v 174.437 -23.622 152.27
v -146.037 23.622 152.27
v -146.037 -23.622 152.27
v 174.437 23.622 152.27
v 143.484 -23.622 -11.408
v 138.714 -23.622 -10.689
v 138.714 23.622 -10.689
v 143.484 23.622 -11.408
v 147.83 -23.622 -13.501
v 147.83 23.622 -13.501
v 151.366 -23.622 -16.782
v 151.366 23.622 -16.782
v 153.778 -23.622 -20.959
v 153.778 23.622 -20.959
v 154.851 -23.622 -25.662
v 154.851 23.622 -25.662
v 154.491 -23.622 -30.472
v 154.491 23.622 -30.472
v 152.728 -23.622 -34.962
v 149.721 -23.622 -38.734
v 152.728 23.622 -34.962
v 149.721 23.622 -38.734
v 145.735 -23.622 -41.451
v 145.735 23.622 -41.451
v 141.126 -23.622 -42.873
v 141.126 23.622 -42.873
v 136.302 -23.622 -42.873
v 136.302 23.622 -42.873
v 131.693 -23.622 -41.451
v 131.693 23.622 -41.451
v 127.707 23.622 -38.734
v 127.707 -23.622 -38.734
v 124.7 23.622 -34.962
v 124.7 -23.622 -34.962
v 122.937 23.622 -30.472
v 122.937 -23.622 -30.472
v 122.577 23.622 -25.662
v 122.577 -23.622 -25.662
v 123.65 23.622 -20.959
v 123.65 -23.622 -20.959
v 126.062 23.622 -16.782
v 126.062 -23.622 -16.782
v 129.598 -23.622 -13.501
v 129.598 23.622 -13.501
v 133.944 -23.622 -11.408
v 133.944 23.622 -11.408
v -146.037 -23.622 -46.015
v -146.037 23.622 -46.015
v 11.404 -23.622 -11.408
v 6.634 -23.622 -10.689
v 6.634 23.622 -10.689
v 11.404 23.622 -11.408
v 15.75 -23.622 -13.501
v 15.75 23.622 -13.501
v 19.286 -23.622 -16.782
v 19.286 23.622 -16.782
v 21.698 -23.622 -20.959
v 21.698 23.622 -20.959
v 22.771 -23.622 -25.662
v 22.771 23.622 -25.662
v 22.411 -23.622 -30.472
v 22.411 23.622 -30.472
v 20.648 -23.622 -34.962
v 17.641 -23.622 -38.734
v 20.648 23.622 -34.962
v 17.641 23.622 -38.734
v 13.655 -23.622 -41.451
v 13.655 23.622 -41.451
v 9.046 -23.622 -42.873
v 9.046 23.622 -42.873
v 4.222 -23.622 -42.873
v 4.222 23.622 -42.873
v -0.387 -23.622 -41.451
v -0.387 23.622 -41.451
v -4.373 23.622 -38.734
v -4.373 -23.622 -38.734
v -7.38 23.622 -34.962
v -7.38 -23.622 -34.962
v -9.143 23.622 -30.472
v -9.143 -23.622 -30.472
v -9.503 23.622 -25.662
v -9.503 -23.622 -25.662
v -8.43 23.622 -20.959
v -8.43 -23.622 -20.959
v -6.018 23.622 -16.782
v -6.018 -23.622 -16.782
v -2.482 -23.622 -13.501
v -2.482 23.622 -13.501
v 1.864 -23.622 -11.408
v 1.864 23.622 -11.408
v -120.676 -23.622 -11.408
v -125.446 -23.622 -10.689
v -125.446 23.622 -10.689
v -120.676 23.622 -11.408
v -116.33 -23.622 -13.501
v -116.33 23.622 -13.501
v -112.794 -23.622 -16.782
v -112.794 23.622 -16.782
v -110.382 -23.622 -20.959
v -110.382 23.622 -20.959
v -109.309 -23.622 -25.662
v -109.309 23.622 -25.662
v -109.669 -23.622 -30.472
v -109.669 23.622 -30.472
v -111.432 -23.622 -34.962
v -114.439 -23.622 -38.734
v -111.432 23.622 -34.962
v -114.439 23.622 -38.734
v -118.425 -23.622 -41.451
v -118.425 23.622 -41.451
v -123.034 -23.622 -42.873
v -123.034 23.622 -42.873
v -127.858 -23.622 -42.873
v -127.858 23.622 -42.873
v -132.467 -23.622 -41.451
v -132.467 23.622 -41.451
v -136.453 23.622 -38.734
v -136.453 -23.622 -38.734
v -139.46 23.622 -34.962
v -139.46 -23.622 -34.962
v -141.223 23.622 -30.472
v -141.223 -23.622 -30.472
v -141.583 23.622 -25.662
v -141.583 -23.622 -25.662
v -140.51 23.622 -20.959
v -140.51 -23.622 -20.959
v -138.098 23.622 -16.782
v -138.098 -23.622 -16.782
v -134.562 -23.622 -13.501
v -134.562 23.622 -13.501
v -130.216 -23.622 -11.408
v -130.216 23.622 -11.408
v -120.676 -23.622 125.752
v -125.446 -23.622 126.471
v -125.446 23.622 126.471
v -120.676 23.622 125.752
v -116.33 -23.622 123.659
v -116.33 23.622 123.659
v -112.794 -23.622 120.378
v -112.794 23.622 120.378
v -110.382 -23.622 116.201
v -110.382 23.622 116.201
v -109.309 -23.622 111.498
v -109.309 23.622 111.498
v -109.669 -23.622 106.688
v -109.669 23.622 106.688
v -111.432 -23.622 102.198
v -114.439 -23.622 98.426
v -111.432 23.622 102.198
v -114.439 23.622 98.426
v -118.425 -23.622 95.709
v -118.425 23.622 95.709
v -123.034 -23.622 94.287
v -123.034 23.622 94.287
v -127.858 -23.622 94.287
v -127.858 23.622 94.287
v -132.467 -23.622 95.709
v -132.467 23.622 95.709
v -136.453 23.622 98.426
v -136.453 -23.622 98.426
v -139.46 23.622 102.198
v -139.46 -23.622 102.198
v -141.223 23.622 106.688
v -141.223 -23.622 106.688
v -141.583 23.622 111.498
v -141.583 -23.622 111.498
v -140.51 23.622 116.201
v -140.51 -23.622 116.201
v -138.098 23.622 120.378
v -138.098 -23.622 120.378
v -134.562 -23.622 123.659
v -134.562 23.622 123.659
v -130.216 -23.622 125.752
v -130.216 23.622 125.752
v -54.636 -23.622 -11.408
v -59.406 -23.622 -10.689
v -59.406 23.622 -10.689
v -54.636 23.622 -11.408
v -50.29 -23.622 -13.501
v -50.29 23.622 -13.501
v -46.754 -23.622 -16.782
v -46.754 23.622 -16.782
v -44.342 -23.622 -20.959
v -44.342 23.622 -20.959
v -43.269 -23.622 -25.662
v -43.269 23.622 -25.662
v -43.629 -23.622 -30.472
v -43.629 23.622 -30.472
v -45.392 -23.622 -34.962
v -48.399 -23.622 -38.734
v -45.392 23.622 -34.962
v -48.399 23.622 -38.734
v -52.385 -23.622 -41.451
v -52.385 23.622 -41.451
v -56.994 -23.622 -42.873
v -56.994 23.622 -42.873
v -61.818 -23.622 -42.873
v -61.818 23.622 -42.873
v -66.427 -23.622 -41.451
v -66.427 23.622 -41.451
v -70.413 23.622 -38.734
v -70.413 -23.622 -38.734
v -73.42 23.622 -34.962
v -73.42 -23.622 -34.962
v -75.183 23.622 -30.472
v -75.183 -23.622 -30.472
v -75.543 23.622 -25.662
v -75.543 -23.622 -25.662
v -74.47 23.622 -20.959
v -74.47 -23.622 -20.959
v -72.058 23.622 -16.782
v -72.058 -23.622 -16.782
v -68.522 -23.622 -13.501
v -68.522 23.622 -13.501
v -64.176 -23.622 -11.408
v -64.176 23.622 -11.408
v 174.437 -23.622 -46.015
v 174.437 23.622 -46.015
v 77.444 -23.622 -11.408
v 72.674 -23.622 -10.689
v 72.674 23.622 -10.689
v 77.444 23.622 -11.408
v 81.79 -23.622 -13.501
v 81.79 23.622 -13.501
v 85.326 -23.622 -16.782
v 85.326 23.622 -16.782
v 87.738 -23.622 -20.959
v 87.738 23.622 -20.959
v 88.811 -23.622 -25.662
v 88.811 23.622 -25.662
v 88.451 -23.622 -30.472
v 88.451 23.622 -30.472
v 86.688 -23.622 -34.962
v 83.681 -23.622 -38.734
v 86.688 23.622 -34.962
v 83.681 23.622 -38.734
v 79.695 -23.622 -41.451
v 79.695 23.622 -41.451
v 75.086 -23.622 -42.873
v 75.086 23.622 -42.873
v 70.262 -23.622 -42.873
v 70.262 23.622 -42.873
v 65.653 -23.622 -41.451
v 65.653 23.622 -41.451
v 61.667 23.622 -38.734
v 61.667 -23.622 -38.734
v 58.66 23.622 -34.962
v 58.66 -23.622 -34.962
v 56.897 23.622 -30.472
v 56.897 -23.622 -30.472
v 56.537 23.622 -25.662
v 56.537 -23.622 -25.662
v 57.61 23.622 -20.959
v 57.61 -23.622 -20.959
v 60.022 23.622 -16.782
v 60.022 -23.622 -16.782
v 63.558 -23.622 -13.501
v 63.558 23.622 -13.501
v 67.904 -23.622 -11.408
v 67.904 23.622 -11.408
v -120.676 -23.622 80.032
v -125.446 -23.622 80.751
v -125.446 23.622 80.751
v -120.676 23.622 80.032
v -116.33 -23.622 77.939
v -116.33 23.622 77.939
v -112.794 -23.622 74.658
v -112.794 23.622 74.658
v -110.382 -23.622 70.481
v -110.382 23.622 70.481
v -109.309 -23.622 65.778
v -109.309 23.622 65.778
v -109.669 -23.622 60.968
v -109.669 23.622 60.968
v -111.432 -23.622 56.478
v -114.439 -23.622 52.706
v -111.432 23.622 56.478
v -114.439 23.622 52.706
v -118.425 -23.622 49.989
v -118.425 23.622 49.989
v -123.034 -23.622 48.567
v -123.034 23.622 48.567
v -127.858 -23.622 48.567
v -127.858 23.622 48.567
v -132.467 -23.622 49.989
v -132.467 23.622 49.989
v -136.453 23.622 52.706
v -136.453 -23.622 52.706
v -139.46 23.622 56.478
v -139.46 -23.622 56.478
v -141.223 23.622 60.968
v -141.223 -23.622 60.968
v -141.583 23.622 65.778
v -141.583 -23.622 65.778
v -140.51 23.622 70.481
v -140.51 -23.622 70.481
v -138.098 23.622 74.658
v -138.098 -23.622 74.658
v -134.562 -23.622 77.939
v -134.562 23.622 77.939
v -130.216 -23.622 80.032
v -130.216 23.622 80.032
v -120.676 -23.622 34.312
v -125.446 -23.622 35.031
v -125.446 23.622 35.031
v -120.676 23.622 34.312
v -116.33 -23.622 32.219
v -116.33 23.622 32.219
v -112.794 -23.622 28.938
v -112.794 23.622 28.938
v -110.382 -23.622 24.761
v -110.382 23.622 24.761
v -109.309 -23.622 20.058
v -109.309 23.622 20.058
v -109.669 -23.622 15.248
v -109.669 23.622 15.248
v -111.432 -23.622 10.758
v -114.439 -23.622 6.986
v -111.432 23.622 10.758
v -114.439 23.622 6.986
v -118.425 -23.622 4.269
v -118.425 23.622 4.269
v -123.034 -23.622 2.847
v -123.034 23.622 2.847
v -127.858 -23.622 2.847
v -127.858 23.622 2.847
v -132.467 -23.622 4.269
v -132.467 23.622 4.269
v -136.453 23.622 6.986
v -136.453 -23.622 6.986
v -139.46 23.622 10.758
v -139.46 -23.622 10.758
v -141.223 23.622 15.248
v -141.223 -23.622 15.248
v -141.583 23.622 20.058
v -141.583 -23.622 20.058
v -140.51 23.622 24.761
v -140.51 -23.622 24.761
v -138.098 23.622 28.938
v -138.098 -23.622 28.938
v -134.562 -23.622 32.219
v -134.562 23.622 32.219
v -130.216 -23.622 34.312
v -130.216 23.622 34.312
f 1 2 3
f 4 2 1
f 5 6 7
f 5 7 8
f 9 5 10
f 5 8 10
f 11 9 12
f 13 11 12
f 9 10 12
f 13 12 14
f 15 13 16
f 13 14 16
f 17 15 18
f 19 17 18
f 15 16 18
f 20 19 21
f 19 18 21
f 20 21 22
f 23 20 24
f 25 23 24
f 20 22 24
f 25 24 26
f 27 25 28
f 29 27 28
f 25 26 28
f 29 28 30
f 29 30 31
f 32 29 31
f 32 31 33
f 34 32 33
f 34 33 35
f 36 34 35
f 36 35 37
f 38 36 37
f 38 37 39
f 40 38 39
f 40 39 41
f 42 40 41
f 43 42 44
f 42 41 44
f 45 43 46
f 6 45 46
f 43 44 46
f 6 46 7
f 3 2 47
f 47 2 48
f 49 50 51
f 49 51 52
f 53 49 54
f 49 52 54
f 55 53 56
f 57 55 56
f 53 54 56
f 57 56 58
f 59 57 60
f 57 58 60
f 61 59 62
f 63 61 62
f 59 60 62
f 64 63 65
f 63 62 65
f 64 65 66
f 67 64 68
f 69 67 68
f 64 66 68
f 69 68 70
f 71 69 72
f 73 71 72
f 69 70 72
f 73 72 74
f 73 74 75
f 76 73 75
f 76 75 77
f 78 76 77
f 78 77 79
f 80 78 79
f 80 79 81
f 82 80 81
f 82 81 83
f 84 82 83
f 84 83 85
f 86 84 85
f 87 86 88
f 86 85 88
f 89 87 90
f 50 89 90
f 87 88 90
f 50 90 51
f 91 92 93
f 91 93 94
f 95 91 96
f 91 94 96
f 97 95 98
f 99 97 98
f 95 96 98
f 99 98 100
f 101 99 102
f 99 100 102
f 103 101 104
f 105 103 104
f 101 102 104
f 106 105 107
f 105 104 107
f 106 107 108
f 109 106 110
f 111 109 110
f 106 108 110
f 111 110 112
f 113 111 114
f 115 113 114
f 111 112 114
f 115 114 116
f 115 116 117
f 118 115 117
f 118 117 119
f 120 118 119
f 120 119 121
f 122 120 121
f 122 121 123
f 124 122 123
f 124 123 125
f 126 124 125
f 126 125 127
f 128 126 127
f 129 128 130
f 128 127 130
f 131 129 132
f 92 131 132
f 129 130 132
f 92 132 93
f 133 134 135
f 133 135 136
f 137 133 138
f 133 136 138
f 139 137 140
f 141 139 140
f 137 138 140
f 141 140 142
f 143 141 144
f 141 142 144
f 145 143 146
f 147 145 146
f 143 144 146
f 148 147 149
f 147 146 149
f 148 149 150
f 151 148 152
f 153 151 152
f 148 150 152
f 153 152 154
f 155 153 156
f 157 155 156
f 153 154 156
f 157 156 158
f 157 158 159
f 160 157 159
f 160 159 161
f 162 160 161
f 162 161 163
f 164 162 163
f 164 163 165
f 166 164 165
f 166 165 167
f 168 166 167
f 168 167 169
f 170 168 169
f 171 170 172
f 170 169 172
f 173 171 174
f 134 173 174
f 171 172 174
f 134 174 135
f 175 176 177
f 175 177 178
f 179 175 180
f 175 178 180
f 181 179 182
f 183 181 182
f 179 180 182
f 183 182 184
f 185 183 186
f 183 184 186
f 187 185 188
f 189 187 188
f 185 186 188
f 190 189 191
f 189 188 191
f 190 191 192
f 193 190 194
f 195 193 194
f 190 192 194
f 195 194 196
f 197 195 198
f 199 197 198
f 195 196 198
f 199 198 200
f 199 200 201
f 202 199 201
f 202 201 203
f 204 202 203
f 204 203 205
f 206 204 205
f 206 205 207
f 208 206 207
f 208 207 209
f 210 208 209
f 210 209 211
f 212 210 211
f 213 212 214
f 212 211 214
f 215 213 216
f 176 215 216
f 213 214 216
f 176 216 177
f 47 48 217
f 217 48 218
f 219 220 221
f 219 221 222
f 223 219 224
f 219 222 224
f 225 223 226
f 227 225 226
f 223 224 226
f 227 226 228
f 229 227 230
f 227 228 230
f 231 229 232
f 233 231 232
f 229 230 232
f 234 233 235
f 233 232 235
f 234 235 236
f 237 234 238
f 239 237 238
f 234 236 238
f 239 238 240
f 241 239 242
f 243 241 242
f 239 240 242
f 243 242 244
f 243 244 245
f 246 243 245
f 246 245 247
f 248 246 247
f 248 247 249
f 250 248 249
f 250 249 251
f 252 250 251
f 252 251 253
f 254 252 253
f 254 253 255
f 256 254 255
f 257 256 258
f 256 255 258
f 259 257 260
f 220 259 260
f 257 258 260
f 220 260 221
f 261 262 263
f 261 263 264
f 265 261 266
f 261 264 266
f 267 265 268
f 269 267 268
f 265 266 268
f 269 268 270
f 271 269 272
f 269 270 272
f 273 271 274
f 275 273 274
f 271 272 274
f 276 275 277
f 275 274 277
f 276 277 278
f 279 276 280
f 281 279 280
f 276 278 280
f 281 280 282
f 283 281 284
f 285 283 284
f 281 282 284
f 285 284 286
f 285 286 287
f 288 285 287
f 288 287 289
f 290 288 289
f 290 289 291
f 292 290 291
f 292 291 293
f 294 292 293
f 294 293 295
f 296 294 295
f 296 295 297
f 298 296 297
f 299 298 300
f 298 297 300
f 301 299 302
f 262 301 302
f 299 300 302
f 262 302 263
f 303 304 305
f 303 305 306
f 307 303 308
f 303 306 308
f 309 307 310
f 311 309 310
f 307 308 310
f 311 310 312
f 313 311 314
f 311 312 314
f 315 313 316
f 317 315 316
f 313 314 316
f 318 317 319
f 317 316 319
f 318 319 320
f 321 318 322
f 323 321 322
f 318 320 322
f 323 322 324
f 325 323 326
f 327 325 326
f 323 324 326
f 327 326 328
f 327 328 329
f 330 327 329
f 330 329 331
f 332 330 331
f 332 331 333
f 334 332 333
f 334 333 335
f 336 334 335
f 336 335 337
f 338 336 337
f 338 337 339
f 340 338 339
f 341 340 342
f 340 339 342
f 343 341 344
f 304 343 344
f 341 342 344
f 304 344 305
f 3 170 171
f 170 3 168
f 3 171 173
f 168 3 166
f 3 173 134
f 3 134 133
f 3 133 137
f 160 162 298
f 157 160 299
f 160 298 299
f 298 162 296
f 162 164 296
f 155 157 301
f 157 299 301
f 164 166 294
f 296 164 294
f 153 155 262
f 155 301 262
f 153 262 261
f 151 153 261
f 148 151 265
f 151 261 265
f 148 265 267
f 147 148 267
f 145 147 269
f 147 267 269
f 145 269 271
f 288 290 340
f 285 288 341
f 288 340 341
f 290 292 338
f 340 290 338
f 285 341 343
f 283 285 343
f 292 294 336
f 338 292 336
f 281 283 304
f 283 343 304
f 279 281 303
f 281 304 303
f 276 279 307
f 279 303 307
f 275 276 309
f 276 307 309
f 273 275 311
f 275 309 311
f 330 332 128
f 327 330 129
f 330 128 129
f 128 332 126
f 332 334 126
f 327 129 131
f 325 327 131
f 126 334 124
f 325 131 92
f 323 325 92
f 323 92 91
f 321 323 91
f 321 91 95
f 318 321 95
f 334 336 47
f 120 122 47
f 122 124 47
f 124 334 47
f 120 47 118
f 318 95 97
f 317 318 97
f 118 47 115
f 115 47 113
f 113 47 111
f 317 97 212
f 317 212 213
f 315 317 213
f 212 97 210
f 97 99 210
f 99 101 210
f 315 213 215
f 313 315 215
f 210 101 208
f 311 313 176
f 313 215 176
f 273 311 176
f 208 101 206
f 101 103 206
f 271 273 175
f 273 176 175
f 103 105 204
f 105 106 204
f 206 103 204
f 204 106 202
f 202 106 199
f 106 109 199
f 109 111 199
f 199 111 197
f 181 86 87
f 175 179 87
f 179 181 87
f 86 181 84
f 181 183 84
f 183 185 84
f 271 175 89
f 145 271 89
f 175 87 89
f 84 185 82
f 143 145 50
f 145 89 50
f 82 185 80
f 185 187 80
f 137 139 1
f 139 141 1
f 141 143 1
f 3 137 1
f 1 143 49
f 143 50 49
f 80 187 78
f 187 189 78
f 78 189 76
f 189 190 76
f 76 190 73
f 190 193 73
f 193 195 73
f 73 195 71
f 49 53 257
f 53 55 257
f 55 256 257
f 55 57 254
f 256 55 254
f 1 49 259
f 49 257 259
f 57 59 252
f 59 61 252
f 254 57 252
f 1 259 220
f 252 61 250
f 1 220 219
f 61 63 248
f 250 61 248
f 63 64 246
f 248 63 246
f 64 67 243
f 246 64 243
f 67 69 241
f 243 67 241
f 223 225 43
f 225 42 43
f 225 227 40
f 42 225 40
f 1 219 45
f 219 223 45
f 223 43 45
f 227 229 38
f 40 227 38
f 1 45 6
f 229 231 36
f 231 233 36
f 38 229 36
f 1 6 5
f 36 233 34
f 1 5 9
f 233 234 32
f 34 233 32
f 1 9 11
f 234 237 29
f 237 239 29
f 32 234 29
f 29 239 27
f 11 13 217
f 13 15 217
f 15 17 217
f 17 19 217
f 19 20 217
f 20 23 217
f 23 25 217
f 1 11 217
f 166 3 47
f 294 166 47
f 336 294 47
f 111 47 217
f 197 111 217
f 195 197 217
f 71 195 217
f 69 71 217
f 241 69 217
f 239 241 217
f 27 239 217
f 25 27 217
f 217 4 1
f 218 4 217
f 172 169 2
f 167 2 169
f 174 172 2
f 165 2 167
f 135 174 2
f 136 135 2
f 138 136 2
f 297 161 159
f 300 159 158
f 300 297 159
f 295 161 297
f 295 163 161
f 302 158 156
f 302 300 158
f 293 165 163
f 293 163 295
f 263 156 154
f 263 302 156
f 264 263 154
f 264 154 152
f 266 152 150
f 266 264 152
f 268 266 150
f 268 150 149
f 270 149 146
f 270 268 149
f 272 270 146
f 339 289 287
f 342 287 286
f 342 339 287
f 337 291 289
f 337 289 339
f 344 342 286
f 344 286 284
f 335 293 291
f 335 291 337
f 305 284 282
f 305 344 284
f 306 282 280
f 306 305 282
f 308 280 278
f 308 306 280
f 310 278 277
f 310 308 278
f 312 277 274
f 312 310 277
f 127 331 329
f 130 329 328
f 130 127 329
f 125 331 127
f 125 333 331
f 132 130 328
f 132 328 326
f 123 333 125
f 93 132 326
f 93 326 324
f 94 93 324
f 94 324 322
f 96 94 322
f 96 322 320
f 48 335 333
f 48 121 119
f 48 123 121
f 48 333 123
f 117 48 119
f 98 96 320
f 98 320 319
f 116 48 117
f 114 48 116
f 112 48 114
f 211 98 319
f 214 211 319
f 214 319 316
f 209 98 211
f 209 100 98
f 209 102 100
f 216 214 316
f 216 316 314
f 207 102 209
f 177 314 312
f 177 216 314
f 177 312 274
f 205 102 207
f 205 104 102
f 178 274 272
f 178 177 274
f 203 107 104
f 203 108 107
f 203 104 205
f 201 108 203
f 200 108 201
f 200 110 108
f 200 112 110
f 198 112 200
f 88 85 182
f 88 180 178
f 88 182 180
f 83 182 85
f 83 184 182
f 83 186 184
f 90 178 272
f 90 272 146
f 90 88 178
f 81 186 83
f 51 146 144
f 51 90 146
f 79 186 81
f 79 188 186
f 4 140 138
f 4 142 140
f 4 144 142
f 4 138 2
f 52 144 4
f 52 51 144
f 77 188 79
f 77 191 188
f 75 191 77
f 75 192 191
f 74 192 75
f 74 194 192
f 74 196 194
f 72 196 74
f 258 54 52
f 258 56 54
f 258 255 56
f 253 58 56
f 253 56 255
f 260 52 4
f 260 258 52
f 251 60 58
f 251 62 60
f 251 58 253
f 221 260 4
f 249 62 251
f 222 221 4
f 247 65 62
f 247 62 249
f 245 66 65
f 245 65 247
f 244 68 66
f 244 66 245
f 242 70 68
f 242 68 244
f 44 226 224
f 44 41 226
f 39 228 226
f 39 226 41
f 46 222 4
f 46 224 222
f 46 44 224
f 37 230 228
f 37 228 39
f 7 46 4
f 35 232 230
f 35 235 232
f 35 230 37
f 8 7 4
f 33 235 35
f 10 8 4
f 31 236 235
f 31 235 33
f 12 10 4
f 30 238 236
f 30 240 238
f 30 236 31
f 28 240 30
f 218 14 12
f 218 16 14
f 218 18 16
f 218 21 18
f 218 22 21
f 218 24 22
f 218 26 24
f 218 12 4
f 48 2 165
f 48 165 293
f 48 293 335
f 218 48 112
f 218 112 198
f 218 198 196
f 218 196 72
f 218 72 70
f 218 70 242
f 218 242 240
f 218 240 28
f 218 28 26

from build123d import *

# Parameters (mm, degrees)
SKETCH1_W           = 320.474741716
SKETCH1_H           = 198.285814429
BOSS_EXTRUDE1_DEPTH = 23.622
SKETCH2_R           = 16.182303952
CUT_EXTRUDE1_DEPTH  = 47.244
LPATTERN1_COUNT     = 5
LPATTERN1_PITCH     = 66.04
LPATTERN1_COL_COUNT = 4
LPATTERN1_COL_PITCH = 45.72


with BuildPart() as part:
    # Sketch1 → Boss-Extrude1 (new, symmetric)
    with BuildSketch(Plane(origin=(0, 0, 0), x_dir=(1, 0, 0), z_dir=(0, 1, 0))):
        with Locations((14.200022321, -53.127541738)):
            Rectangle(SKETCH1_W, SKETCH1_H)
    extrude(amount=BOSS_EXTRUDE1_DEPTH, both=True)

    # Sketch2 → Cut-Extrude1 (cut)
    with BuildSketch(Plane(origin=(0, 23.622, 0), x_dir=(1, 0, 0), z_dir=(0, 1, 0))):
        with Locations(Location((-125.445944565, 26.871307357, 0), (0, 0, 270))):
            Circle(SKETCH2_R)
    cut_extrude1 = extrude(amount=-CUT_EXTRUDE1_DEPTH, mode=Mode.SUBTRACT)

    # LPattern1: Cut-Extrude1 ×5
    with Locations(*[(i * LPATTERN1_PITCH, 0, 0) for i in range(1, LPATTERN1_COUNT)]):
        add(cut_extrude1, mode=Mode.SUBTRACT)

    # LPattern1 col: Cut-Extrude1 ×4
    with Locations(*[(0, 0, i * LPATTERN1_COL_PITCH) for i in range(1, LPATTERN1_COL_COUNT)]):
        add(cut_extrude1, mode=Mode.SUBTRACT)


solid = part.part
